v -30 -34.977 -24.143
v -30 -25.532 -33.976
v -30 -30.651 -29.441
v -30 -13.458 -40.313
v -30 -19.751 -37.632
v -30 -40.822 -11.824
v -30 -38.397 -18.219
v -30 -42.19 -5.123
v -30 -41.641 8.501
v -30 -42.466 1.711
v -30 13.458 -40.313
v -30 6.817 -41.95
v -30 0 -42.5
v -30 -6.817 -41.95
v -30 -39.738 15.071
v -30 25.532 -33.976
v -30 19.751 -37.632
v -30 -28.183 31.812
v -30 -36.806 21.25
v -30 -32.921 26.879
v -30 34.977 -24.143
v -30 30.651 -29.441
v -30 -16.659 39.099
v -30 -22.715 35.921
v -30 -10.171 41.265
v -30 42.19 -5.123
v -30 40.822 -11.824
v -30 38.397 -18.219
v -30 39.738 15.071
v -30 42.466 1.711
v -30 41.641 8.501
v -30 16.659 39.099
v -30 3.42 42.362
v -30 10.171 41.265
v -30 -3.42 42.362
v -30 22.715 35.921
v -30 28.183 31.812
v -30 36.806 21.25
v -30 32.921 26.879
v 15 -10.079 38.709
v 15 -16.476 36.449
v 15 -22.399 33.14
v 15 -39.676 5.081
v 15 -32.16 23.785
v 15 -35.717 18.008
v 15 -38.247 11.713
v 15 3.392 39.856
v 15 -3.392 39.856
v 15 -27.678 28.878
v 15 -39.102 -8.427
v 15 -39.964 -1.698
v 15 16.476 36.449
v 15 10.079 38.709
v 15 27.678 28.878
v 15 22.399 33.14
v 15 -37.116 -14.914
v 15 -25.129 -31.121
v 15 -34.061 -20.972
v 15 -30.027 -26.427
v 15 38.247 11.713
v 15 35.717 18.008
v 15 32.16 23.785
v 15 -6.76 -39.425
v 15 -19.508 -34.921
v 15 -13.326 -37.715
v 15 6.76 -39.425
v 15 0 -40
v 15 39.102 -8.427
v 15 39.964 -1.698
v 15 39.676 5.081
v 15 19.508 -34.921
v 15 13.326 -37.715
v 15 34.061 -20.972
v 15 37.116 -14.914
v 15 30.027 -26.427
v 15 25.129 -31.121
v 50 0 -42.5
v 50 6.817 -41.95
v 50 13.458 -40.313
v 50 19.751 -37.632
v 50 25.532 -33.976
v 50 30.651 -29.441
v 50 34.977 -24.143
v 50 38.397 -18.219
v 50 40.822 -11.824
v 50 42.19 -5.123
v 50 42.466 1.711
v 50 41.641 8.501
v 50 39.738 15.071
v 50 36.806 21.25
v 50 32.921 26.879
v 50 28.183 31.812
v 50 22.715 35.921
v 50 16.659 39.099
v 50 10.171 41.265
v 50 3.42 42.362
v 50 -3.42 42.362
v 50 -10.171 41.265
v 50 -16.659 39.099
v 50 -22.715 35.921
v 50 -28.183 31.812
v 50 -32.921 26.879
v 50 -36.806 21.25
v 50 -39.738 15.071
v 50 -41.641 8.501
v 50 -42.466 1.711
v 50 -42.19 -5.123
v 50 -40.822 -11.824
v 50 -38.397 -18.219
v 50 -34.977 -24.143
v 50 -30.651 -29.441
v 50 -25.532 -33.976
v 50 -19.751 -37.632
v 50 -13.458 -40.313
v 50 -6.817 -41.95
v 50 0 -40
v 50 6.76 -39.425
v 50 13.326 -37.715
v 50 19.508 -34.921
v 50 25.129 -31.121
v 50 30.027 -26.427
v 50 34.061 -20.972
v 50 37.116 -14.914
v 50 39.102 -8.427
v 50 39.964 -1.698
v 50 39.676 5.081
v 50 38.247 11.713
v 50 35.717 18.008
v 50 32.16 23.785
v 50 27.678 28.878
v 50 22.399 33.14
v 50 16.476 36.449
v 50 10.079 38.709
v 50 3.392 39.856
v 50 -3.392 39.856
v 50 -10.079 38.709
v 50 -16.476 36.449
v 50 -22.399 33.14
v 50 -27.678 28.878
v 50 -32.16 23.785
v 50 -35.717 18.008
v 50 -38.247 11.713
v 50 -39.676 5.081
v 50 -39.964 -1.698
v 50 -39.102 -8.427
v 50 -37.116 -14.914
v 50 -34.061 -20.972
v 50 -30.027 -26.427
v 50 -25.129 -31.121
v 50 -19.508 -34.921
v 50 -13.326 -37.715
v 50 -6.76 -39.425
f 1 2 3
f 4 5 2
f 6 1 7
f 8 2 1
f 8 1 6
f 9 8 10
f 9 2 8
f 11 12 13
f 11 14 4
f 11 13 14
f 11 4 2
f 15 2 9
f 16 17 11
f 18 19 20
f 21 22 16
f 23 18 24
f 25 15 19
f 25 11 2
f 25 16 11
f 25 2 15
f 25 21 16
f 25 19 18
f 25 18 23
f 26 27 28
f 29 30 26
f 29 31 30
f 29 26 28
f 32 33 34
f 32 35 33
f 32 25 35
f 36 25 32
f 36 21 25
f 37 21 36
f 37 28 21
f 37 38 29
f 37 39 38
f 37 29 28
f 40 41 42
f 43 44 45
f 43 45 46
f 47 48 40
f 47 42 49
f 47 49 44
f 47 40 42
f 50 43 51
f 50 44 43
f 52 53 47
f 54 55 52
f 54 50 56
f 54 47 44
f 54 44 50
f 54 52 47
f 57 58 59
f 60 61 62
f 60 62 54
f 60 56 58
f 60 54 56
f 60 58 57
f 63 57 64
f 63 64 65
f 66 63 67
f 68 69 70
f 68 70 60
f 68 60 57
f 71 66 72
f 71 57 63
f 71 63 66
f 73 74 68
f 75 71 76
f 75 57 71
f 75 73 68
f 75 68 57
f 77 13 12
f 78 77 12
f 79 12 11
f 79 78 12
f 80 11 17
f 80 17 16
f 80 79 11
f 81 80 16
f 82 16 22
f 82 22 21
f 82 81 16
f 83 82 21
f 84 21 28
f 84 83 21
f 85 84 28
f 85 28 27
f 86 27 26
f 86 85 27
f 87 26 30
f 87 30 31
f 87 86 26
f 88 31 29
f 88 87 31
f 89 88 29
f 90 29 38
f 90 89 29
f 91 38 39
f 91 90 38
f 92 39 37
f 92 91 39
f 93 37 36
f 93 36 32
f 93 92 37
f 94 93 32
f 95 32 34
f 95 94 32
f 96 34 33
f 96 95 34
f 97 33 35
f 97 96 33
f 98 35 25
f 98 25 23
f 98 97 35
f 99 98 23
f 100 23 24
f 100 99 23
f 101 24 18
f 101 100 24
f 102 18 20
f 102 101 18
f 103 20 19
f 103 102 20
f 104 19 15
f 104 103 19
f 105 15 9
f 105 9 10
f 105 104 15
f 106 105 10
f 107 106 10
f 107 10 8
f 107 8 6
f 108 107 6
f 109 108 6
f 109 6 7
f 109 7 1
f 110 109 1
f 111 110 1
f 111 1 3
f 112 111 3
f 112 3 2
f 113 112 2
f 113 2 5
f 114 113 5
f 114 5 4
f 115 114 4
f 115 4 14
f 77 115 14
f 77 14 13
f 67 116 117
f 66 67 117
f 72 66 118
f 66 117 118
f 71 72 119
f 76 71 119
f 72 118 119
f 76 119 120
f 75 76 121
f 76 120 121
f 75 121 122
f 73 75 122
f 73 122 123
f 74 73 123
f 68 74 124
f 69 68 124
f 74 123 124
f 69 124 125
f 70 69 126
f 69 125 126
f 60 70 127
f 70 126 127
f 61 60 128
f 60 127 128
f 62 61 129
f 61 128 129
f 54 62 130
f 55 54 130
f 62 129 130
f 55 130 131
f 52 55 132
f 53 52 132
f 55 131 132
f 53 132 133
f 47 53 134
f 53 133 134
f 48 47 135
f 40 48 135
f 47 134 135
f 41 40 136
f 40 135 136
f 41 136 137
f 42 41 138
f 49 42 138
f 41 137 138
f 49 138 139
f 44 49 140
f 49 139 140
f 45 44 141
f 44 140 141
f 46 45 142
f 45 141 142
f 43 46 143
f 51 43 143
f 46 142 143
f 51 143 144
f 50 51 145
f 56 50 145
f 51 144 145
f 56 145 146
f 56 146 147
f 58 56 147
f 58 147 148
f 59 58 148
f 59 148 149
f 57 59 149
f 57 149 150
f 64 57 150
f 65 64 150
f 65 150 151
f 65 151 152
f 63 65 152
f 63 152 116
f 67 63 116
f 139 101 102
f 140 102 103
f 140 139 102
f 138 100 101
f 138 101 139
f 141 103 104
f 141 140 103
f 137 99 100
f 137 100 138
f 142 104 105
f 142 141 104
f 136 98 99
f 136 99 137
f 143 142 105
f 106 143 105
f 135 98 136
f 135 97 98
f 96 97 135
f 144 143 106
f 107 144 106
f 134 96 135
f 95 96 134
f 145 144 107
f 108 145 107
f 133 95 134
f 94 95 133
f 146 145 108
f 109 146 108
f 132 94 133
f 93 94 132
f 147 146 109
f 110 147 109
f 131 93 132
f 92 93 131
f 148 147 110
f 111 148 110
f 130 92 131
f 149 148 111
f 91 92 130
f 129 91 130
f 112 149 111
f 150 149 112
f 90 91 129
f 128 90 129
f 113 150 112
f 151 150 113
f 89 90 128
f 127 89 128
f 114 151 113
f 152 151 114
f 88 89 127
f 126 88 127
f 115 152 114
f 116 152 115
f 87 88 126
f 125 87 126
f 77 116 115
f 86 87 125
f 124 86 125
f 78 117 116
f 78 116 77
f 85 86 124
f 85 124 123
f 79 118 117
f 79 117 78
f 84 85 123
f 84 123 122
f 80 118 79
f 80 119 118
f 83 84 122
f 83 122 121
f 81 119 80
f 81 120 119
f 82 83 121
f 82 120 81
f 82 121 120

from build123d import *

# Parameters (mm, degrees)
SKETCH1_R           = 42.5
BOSS_EXTRUDE1_DEPTH = 50
SKETCH6_R           = 40
CUT_EXTRUDE6_DEPTH  = 35
SKETCH9_R           = 42.5
CUT_EXTRUDE12_DEPTH = 20


with BuildPart() as part:
    # Sketch1 → Boss-Extrude1 (new body, symmetric)
    with BuildSketch(Plane(origin=(0, 0, 0), x_dir=(0, 0, -1), z_dir=(1, 0, 0))):
        Circle(SKETCH1_R)
    extrude(amount=BOSS_EXTRUDE1_DEPTH, both=True)

    # Sketch6 → Cut-Extrude6 (cut)
    with BuildSketch(Plane(origin=(50, 0, 0), x_dir=(0, 0, -1), z_dir=(1, 0, 0))):
        Circle(SKETCH6_R)
    extrude(amount=-CUT_EXTRUDE6_DEPTH, mode=Mode.SUBTRACT)

    # Sketch9 → Cut-Extrude12 (cut)
    with BuildSketch(Plane.ZY.offset(50)):
        Circle(SKETCH9_R)
    extrude(amount=-CUT_EXTRUDE12_DEPTH, mode=Mode.SUBTRACT)


solid = part.part
